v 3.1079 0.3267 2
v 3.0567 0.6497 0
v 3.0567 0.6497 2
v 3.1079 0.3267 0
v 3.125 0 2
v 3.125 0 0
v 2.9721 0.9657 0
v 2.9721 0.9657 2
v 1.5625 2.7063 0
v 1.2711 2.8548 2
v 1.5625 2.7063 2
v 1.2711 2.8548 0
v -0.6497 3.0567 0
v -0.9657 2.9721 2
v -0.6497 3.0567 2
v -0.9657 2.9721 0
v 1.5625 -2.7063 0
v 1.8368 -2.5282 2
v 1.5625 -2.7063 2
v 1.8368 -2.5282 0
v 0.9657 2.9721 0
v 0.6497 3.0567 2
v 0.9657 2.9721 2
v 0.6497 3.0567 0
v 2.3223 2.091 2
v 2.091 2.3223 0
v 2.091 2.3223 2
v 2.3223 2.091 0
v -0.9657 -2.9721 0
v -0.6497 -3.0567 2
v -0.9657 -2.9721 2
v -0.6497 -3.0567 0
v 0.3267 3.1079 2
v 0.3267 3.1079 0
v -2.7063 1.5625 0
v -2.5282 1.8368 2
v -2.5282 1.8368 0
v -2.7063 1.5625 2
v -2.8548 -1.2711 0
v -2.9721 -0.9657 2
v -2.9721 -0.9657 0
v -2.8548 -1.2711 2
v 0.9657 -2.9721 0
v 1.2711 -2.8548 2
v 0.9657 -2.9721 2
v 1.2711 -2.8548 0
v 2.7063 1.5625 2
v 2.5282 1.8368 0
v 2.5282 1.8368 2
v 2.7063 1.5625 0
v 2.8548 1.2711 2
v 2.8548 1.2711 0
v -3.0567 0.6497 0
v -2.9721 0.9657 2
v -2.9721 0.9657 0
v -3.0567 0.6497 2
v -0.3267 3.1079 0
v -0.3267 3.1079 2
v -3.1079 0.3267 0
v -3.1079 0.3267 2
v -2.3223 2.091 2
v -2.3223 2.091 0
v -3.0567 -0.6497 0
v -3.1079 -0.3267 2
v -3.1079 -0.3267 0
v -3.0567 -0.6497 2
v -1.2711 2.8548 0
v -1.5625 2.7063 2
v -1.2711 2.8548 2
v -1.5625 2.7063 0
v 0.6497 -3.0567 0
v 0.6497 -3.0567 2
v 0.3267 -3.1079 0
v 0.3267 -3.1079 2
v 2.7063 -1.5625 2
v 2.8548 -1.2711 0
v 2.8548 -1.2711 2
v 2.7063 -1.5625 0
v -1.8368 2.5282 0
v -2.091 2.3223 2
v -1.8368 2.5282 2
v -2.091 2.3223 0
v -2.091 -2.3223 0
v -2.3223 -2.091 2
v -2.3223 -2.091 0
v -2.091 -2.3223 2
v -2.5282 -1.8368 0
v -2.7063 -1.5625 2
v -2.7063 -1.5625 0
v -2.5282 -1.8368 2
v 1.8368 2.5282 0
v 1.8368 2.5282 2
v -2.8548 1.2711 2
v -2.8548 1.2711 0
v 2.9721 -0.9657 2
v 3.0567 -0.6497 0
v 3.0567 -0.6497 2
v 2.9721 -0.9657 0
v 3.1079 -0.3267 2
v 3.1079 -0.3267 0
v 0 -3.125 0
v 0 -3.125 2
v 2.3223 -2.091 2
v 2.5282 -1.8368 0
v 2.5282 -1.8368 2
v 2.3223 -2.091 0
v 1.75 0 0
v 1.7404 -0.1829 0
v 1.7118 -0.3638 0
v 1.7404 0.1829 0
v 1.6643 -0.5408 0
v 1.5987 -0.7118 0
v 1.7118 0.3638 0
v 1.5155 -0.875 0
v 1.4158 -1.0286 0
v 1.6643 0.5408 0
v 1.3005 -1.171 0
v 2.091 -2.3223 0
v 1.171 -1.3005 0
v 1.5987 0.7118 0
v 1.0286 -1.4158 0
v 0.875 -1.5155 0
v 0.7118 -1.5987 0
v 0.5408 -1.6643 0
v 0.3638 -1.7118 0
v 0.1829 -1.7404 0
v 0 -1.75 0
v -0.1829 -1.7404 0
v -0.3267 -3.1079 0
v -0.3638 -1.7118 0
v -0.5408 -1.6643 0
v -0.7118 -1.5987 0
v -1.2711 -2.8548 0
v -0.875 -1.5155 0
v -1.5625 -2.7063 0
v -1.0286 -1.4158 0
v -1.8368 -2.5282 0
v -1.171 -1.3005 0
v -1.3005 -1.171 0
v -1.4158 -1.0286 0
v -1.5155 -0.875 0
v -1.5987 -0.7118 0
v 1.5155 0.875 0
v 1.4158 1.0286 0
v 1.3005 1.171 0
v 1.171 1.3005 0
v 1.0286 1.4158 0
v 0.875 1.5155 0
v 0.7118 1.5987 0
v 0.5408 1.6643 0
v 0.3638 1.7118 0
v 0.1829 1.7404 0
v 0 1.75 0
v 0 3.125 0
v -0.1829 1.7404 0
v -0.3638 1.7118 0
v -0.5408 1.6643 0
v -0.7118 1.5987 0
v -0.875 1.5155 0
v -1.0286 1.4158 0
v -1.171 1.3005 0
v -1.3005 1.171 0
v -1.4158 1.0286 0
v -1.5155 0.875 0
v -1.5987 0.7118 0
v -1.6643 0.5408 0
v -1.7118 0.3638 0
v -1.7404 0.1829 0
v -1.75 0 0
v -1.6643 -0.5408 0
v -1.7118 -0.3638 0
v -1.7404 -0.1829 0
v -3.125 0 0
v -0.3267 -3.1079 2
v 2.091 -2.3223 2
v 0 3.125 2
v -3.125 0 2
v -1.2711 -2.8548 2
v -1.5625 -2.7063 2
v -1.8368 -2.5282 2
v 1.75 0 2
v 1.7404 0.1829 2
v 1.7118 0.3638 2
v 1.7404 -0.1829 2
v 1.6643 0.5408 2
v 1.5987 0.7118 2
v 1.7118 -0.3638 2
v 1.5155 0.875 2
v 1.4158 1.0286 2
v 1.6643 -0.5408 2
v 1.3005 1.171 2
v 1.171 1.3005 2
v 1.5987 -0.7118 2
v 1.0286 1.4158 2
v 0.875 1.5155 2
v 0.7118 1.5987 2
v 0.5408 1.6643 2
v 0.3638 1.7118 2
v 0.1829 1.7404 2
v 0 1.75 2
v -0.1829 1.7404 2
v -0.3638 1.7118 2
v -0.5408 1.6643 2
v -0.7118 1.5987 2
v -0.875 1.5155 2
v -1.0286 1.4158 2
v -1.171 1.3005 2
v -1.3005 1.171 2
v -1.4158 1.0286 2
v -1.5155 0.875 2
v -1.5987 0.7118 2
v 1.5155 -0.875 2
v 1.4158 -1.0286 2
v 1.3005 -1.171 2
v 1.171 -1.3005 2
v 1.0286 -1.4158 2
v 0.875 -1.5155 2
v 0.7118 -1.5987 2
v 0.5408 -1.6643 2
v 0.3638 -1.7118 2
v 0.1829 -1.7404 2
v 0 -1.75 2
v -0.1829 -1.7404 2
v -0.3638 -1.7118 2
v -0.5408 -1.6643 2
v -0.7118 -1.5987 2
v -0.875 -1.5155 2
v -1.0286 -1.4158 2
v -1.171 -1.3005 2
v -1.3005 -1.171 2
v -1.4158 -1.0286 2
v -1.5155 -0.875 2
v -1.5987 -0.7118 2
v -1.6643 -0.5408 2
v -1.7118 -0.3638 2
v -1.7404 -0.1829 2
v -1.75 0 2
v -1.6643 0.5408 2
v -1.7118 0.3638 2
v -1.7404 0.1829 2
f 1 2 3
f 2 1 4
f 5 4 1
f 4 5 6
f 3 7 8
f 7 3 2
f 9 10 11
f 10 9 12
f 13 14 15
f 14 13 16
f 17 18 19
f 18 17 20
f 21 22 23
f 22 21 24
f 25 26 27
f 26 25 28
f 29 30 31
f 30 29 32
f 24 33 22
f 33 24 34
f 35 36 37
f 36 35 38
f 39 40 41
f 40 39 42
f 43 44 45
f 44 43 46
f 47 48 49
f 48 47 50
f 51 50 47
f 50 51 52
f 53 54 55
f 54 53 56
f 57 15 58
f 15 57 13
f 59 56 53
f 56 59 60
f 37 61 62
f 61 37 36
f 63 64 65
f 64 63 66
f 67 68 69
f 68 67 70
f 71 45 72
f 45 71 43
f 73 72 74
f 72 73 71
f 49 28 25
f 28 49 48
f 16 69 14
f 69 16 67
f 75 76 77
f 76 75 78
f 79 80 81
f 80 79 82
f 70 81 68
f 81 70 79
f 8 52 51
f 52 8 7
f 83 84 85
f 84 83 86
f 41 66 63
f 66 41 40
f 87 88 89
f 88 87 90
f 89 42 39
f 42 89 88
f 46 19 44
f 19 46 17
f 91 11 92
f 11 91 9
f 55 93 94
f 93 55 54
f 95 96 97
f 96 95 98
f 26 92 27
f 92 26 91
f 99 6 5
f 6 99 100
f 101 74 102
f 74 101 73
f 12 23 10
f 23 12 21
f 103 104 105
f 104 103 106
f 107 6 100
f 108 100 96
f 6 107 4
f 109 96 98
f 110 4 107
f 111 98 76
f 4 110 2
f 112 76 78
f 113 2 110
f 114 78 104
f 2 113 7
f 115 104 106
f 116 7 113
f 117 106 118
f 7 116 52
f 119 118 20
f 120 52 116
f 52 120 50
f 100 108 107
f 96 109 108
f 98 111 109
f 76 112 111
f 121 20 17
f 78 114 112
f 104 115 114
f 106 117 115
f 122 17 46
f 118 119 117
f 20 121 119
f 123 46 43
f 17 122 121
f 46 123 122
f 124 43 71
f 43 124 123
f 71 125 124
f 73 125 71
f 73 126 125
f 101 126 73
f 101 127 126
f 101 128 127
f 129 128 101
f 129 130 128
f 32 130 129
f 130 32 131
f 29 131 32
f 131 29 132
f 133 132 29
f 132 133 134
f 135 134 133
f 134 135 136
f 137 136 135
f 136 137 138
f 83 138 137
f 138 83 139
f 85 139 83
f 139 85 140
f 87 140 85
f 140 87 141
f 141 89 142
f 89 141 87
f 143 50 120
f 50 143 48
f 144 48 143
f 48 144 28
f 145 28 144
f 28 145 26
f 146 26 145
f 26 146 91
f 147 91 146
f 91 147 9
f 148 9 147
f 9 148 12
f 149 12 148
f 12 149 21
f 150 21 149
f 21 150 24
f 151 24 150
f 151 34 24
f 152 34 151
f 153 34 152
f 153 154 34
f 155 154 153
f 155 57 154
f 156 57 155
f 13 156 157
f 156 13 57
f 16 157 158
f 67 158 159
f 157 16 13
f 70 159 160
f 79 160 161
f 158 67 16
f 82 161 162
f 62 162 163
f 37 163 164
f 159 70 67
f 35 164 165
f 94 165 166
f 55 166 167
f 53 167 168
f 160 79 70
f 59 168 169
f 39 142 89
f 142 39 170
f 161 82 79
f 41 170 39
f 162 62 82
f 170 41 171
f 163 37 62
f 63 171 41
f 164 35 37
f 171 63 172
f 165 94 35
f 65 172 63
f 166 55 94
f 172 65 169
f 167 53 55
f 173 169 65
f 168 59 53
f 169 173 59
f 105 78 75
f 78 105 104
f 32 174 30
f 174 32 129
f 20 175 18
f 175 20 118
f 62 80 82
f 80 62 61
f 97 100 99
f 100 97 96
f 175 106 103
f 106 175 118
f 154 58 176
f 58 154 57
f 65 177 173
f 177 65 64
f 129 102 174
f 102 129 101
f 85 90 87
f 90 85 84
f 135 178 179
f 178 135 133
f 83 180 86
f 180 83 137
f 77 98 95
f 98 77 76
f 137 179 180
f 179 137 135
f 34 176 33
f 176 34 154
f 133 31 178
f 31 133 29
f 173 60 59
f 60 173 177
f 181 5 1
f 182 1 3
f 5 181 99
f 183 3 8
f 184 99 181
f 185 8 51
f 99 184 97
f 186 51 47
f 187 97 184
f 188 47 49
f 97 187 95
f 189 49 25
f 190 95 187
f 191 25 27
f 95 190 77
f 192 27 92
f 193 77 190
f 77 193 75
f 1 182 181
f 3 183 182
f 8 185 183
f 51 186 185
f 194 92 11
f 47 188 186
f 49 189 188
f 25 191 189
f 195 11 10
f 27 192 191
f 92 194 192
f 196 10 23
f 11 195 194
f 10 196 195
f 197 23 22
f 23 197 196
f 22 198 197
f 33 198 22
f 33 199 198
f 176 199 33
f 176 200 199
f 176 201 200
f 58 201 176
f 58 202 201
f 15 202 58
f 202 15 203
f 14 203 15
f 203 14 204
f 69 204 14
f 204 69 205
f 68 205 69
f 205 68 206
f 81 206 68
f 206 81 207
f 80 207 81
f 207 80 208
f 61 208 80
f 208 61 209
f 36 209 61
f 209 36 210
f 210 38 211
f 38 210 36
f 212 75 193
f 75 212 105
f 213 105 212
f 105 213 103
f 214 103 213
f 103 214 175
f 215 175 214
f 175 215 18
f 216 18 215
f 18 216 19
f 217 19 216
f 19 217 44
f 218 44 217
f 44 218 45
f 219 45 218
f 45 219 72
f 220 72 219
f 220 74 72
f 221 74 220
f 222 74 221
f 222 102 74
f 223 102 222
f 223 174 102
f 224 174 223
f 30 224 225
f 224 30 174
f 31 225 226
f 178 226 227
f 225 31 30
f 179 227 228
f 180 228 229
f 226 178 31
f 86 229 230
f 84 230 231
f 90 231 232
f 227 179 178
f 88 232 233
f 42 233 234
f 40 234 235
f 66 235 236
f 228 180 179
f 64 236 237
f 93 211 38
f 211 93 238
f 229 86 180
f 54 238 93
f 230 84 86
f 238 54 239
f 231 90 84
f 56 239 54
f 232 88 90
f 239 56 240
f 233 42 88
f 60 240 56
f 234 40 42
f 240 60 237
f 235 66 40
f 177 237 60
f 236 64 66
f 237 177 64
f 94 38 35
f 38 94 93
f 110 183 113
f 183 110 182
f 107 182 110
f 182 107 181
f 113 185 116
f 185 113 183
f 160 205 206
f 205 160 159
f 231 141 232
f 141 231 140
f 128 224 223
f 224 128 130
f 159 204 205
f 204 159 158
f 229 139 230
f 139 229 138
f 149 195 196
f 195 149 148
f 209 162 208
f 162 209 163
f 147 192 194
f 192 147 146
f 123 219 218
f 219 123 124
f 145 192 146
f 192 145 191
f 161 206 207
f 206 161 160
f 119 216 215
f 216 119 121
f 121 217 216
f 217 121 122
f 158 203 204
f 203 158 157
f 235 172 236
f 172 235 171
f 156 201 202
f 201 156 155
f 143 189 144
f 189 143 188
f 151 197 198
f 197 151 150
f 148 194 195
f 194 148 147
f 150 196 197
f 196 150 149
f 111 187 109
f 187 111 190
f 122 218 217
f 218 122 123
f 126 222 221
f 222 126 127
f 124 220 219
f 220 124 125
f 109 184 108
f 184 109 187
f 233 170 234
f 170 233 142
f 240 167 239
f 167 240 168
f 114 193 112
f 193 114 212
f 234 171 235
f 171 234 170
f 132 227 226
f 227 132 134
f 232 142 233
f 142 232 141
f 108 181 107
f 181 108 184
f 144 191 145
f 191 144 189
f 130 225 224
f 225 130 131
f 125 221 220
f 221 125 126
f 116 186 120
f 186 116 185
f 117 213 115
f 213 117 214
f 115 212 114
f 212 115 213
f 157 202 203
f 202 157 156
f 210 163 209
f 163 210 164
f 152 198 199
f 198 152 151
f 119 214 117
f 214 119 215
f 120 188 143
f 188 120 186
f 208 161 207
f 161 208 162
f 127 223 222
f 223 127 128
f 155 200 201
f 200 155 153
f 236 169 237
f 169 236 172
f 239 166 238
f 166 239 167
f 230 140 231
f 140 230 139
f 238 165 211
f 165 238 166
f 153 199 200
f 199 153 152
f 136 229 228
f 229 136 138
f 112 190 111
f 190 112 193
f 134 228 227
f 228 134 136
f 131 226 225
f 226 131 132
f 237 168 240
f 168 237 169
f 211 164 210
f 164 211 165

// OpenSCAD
thick = 2;
innerdia=3.5;
outerdia=6.25;
res=60;

difference(){
    cylinder(thick, d=outerdia, $fn=res);
    cylinder(thick, d=innerdia, $fn=res);
}
